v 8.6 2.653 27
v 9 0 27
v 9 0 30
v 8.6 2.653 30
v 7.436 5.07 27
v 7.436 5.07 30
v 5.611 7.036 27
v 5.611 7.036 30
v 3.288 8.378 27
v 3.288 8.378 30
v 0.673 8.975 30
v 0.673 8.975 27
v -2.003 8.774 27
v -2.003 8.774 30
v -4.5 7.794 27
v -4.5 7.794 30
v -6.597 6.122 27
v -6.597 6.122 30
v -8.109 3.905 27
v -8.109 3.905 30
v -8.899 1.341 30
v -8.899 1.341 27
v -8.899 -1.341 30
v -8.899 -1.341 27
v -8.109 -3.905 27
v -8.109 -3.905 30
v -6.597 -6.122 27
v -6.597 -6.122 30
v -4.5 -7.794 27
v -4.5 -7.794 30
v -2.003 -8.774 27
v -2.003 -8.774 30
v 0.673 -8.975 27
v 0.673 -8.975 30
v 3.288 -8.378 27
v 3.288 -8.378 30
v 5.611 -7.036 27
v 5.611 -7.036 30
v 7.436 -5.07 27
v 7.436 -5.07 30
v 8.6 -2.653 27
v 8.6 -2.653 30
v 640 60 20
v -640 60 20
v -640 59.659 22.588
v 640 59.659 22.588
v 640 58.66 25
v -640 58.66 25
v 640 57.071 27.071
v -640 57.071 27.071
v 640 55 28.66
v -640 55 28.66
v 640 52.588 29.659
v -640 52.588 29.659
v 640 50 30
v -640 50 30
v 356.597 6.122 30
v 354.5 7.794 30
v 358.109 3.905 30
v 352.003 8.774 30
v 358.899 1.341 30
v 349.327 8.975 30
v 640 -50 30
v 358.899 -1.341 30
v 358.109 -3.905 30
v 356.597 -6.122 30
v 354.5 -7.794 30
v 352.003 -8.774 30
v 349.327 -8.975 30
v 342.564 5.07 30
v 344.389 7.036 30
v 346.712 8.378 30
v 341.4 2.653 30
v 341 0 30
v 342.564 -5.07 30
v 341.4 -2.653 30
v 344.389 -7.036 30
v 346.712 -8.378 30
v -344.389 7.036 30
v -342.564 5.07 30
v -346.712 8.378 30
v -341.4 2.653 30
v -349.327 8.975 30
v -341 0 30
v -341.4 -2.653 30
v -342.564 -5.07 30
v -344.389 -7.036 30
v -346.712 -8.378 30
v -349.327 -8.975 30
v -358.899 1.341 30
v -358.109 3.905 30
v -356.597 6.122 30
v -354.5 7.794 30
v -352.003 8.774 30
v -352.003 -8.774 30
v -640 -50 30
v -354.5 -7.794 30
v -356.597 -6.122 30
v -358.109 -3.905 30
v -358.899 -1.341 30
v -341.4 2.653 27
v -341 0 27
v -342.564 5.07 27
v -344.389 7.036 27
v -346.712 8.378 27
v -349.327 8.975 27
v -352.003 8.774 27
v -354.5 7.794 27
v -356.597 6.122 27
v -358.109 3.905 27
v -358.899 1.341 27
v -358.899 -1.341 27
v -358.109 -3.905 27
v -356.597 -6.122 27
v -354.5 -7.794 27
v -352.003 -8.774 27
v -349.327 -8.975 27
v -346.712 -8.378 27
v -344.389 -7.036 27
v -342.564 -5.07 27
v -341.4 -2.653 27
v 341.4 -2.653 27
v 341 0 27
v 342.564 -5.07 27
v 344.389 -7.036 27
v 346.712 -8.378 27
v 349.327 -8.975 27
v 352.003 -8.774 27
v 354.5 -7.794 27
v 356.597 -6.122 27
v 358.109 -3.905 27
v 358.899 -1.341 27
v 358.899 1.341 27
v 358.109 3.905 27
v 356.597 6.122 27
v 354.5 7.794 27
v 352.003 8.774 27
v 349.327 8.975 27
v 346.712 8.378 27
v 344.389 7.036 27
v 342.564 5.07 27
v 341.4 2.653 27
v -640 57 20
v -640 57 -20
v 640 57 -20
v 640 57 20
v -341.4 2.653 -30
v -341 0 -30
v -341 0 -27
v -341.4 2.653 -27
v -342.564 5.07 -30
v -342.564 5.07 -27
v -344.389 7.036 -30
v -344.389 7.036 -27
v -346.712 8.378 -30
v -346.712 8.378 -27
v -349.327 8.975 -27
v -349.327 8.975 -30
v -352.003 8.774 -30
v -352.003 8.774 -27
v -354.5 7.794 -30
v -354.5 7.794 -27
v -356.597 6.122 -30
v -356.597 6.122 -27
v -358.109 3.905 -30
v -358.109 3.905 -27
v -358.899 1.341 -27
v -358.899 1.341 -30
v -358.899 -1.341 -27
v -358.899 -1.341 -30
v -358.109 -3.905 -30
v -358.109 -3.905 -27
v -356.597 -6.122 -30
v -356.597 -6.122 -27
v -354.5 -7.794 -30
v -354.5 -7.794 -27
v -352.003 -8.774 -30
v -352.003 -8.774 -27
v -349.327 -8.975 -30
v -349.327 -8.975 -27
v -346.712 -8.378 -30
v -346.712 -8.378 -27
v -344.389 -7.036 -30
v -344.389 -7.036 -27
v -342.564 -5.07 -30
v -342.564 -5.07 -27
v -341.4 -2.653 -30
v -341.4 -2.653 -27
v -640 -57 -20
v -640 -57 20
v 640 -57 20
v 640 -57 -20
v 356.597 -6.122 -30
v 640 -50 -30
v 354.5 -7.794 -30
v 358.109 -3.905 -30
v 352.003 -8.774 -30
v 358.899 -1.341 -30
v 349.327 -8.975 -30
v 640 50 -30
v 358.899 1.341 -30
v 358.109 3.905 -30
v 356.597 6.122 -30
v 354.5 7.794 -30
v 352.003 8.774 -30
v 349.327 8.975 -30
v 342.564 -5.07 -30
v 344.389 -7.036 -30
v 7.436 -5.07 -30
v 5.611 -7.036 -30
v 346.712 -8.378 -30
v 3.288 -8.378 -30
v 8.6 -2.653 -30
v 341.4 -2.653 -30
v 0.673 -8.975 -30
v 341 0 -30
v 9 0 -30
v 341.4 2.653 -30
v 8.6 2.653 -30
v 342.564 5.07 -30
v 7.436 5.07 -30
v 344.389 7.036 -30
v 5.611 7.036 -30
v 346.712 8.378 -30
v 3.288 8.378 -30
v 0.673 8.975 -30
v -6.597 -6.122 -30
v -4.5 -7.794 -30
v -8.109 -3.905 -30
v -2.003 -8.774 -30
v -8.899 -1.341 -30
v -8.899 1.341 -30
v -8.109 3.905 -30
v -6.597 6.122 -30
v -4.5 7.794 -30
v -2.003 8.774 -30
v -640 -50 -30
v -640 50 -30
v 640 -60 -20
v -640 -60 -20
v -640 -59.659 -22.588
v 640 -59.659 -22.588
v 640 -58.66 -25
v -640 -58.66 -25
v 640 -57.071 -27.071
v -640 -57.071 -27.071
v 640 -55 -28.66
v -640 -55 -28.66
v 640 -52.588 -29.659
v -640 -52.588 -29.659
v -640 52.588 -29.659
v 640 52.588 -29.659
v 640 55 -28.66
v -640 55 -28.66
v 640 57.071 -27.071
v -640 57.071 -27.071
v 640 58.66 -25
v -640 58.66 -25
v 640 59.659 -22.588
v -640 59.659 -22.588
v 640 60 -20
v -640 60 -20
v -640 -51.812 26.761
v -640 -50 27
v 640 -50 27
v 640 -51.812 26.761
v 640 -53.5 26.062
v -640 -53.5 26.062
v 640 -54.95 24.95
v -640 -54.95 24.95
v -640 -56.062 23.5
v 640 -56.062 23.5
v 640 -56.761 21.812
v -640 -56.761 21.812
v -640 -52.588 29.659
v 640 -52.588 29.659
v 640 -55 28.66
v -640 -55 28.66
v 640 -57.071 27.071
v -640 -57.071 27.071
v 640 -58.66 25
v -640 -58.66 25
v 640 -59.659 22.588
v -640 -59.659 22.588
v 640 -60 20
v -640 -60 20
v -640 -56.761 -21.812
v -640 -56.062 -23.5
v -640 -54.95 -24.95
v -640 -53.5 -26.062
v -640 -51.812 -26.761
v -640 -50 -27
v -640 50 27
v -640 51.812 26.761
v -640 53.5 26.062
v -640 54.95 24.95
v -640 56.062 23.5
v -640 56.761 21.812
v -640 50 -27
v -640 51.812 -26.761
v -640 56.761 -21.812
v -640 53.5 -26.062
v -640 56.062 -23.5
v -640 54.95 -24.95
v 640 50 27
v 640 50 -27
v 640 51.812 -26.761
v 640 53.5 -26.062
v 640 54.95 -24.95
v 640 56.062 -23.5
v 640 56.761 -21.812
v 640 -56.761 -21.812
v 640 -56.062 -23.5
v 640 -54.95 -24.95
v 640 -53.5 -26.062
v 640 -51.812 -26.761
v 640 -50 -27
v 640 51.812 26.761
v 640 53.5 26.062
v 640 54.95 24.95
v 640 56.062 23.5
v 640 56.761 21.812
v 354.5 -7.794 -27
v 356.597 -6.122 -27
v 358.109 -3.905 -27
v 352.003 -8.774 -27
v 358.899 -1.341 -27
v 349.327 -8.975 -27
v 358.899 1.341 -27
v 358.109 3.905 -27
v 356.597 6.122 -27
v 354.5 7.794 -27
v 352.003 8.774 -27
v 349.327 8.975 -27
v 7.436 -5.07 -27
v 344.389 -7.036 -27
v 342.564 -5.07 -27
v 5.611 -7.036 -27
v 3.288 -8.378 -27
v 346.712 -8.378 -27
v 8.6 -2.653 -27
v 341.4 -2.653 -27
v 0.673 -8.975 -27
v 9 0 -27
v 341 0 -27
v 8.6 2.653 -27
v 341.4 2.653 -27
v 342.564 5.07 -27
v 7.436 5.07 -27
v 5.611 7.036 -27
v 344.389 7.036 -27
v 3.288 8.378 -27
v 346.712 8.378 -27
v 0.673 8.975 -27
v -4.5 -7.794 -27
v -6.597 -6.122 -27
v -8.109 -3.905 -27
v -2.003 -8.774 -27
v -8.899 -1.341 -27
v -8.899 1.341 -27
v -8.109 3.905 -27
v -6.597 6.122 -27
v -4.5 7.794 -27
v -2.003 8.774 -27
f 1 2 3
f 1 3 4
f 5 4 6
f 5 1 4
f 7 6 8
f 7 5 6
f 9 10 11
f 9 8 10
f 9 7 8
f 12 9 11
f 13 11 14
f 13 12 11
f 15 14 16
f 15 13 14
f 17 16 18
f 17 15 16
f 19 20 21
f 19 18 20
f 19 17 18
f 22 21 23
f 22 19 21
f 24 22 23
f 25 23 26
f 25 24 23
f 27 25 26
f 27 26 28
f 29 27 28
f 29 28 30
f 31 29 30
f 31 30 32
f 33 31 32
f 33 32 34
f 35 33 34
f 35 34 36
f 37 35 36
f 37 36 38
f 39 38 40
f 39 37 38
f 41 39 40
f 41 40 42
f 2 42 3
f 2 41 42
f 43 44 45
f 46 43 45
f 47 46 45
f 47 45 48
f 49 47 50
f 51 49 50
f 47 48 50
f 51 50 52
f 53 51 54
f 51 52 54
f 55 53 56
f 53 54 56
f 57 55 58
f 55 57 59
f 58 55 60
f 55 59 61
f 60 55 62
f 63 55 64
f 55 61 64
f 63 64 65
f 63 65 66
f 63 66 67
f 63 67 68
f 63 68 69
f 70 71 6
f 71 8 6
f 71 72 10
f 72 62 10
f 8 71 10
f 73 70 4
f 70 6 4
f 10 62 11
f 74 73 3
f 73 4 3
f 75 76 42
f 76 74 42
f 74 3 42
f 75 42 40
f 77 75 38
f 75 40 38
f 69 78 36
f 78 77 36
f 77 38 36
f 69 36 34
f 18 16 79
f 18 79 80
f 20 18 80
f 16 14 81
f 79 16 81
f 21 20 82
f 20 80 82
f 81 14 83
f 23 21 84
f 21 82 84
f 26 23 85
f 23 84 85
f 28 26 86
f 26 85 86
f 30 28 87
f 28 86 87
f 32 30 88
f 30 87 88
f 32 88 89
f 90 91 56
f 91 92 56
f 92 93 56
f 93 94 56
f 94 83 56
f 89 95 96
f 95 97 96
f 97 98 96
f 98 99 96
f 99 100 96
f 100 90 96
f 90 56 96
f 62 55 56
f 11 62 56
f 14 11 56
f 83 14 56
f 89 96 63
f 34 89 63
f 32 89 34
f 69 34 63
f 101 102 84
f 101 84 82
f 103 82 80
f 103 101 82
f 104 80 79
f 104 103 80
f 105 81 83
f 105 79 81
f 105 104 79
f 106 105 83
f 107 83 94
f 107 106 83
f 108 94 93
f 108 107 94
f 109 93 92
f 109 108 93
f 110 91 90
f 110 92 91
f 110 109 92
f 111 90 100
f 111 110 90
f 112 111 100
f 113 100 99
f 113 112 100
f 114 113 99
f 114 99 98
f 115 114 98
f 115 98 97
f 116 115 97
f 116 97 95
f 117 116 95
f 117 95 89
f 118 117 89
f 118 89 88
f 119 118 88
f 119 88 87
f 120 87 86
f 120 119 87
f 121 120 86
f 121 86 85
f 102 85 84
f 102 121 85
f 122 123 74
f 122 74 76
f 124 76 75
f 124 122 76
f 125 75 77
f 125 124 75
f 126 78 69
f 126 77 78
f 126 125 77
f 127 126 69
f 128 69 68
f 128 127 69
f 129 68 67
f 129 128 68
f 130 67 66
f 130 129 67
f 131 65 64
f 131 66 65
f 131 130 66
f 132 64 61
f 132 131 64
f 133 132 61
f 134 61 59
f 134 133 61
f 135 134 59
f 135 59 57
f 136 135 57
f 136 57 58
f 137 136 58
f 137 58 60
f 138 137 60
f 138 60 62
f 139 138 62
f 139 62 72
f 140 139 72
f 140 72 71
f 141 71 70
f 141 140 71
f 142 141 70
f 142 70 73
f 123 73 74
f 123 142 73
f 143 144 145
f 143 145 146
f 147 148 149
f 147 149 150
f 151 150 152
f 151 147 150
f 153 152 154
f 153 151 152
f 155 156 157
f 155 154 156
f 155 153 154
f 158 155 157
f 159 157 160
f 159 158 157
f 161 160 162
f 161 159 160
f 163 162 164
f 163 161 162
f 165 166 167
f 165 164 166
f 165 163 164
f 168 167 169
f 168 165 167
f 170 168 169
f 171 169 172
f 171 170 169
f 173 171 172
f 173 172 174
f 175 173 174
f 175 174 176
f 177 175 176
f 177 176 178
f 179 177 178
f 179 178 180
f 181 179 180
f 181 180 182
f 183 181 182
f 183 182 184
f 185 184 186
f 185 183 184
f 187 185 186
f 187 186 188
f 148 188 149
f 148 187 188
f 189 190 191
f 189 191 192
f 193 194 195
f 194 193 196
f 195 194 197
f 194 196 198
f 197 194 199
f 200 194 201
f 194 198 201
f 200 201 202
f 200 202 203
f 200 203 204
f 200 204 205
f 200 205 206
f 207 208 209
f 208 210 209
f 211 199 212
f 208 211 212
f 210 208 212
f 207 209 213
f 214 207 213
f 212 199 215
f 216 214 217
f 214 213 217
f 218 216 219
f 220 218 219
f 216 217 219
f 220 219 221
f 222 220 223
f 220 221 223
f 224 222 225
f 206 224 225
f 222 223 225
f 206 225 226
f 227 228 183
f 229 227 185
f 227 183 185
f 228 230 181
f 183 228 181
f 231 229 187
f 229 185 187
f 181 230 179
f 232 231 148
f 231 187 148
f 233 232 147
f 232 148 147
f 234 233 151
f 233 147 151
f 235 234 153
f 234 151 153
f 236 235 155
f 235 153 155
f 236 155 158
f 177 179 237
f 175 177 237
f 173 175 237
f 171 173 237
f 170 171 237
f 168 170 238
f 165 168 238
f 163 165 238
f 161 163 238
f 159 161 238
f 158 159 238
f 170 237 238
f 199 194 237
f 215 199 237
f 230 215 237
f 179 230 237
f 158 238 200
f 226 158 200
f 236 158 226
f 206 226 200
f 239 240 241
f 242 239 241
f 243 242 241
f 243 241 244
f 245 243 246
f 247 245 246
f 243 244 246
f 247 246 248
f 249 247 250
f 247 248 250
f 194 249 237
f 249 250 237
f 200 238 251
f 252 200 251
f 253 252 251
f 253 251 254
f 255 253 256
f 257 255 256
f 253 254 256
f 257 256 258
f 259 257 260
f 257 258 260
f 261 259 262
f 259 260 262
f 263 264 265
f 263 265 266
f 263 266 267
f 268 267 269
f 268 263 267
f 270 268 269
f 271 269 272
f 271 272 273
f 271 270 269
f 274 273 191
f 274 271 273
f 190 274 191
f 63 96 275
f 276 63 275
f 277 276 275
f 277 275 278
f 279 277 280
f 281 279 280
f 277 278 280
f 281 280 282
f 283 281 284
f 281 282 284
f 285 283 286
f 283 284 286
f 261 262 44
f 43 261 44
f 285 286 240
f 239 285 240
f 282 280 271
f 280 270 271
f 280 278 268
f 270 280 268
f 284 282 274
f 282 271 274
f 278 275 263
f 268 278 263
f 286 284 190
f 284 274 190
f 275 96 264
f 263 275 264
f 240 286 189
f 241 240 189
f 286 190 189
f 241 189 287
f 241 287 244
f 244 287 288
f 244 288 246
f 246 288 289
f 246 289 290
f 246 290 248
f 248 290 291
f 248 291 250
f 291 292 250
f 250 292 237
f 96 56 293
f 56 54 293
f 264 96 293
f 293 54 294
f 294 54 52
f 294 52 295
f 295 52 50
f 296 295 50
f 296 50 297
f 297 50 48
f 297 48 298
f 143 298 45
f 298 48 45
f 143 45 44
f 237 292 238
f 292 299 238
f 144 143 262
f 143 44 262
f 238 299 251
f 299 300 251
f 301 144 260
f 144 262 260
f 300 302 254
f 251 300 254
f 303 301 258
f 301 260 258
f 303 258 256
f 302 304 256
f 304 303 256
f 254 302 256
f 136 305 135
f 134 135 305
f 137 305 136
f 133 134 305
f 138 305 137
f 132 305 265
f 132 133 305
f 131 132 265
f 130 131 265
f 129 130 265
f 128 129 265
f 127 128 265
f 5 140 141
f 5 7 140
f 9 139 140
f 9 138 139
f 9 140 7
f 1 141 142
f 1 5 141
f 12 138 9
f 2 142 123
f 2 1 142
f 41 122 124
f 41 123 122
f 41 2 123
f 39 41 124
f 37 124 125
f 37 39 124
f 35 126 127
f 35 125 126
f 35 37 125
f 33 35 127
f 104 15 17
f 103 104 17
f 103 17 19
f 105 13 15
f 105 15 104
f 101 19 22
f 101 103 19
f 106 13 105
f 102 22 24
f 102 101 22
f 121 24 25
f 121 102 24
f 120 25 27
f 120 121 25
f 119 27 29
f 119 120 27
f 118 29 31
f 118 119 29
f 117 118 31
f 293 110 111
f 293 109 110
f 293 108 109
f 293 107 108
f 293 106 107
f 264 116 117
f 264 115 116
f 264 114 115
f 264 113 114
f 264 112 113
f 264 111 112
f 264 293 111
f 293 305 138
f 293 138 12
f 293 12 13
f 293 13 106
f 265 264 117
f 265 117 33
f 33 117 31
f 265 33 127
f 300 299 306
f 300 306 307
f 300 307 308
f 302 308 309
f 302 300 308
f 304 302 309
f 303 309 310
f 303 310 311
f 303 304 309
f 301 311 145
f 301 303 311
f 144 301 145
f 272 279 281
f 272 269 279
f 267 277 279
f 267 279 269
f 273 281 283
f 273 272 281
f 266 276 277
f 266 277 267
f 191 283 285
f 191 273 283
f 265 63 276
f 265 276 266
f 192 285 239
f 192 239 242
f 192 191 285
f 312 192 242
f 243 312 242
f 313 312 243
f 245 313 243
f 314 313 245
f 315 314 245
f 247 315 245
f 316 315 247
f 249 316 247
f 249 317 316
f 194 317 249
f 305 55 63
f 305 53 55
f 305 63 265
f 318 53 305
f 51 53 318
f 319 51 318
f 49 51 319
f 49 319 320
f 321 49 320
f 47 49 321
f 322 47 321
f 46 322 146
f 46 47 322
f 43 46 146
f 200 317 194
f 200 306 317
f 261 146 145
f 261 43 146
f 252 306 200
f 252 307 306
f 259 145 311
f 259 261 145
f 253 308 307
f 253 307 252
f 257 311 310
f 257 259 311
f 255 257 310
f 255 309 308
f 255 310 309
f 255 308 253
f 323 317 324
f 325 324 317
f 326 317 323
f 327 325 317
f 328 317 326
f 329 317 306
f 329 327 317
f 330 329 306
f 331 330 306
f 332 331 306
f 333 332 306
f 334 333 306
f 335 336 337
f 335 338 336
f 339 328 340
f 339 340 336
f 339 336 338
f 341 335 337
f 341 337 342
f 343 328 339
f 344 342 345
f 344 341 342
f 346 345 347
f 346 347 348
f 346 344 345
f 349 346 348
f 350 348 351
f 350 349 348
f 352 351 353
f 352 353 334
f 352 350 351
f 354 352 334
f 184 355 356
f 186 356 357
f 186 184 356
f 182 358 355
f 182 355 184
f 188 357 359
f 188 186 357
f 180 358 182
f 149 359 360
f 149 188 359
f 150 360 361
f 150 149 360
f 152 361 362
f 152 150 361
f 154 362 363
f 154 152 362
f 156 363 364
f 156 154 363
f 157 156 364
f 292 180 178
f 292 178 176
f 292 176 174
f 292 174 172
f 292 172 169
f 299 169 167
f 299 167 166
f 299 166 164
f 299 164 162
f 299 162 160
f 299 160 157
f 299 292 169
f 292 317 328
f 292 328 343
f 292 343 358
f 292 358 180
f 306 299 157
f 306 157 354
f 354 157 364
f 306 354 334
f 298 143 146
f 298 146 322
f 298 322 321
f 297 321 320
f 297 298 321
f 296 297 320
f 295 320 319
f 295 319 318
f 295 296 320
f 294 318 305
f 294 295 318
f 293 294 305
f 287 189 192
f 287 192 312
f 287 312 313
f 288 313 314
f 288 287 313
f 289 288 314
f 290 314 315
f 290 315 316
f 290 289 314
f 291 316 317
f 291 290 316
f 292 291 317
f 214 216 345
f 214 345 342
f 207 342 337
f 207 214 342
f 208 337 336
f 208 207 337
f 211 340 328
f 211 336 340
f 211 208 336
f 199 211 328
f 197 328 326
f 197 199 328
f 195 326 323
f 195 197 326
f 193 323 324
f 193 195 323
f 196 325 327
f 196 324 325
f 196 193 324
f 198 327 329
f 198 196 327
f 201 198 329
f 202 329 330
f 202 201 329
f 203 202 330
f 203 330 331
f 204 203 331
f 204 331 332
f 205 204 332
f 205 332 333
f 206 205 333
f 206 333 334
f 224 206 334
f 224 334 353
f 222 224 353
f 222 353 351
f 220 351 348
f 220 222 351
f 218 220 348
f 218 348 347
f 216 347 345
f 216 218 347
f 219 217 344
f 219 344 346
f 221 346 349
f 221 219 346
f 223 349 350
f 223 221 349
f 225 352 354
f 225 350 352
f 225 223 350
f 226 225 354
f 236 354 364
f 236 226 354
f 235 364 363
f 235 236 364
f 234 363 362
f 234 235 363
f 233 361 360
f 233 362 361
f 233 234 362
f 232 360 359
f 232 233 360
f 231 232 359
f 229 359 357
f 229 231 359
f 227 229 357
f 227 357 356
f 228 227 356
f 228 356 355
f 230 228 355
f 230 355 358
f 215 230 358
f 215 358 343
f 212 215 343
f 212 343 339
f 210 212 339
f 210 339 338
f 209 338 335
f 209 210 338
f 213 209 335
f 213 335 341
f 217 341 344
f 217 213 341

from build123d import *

# Parameters (mm, degrees)
EXTRUDE_THIN1_DEPTH      = 640
EXTRUDE_THIN1_DEPTH_BACK = 640
CUT_EXTRUDE1_DEPTH       = 644.506021728
CUT_EXTRUDE1_DEPTH_BACK  = 644.506021728
SKETCH2_R                = 9


with BuildPart() as part:
    # Sketch1 → Extrude-Thin1 (new, two sides: drawn at the far end of the back side and taken through both)
    with BuildSketch(Plane(origin=(0, 0, 0), x_dir=(0, 0, -1), z_dir=(1, 0, 0)).offset(-EXTRUDE_THIN1_DEPTH_BACK)):
        with BuildLine():
            Line((-30, 50), (-30, -50))
            ThreePointArc((-30, -50), (-27.071067812, -57.071067812), (-20, -60))
            Line((-20, -60), (20, -60))
            ThreePointArc((20, -60), (27.071067812, -57.071067812), (30, -50))
            Line((30, -50), (30, 50))
            ThreePointArc((30, 50), (27.071067812, 57.071067812), (20, 60))
            Line((20, 60), (-20, 60))
            ThreePointArc((-20, 60), (-27.071067812, 57.071067812), (-30, 50))
        make_face()
        with BuildLine():
            Line((-27, 50), (-27, -50))
            ThreePointArc((-27, -50), (-24.949747468, -54.949747468), (-20, -57))
            Line((-20, -57), (20, -57))
            ThreePointArc((20, -57), (24.949747468, -54.949747468), (27, -50))
            Line((27, -50), (27, 50))
            ThreePointArc((27, 50), (24.949747468, 54.949747468), (20, 57))
            Line((20, 57), (-20, 57))
            ThreePointArc((-20, 57), (-24.949747468, 54.949747468), (-27, 50))
        make_face(mode=Mode.SUBTRACT)
    extrude(amount=EXTRUDE_THIN1_DEPTH + EXTRUDE_THIN1_DEPTH_BACK)

    # Sketch2 → Cut-Extrude1 (cut, two sides: drawn at the far end of the back side and taken through both)
    with BuildSketch(Plane.XY.offset(-CUT_EXTRUDE1_DEPTH_BACK)):
        Circle(SKETCH2_R)
        with Locations((-350, 0)):
            Circle(SKETCH2_R)
        with Locations(Location((350, 0, 0), (0, 0, 180))):
            Circle(SKETCH2_R)
    extrude(amount=CUT_EXTRUDE1_DEPTH + CUT_EXTRUDE1_DEPTH_BACK, mode=Mode.SUBTRACT)


solid = part.part
